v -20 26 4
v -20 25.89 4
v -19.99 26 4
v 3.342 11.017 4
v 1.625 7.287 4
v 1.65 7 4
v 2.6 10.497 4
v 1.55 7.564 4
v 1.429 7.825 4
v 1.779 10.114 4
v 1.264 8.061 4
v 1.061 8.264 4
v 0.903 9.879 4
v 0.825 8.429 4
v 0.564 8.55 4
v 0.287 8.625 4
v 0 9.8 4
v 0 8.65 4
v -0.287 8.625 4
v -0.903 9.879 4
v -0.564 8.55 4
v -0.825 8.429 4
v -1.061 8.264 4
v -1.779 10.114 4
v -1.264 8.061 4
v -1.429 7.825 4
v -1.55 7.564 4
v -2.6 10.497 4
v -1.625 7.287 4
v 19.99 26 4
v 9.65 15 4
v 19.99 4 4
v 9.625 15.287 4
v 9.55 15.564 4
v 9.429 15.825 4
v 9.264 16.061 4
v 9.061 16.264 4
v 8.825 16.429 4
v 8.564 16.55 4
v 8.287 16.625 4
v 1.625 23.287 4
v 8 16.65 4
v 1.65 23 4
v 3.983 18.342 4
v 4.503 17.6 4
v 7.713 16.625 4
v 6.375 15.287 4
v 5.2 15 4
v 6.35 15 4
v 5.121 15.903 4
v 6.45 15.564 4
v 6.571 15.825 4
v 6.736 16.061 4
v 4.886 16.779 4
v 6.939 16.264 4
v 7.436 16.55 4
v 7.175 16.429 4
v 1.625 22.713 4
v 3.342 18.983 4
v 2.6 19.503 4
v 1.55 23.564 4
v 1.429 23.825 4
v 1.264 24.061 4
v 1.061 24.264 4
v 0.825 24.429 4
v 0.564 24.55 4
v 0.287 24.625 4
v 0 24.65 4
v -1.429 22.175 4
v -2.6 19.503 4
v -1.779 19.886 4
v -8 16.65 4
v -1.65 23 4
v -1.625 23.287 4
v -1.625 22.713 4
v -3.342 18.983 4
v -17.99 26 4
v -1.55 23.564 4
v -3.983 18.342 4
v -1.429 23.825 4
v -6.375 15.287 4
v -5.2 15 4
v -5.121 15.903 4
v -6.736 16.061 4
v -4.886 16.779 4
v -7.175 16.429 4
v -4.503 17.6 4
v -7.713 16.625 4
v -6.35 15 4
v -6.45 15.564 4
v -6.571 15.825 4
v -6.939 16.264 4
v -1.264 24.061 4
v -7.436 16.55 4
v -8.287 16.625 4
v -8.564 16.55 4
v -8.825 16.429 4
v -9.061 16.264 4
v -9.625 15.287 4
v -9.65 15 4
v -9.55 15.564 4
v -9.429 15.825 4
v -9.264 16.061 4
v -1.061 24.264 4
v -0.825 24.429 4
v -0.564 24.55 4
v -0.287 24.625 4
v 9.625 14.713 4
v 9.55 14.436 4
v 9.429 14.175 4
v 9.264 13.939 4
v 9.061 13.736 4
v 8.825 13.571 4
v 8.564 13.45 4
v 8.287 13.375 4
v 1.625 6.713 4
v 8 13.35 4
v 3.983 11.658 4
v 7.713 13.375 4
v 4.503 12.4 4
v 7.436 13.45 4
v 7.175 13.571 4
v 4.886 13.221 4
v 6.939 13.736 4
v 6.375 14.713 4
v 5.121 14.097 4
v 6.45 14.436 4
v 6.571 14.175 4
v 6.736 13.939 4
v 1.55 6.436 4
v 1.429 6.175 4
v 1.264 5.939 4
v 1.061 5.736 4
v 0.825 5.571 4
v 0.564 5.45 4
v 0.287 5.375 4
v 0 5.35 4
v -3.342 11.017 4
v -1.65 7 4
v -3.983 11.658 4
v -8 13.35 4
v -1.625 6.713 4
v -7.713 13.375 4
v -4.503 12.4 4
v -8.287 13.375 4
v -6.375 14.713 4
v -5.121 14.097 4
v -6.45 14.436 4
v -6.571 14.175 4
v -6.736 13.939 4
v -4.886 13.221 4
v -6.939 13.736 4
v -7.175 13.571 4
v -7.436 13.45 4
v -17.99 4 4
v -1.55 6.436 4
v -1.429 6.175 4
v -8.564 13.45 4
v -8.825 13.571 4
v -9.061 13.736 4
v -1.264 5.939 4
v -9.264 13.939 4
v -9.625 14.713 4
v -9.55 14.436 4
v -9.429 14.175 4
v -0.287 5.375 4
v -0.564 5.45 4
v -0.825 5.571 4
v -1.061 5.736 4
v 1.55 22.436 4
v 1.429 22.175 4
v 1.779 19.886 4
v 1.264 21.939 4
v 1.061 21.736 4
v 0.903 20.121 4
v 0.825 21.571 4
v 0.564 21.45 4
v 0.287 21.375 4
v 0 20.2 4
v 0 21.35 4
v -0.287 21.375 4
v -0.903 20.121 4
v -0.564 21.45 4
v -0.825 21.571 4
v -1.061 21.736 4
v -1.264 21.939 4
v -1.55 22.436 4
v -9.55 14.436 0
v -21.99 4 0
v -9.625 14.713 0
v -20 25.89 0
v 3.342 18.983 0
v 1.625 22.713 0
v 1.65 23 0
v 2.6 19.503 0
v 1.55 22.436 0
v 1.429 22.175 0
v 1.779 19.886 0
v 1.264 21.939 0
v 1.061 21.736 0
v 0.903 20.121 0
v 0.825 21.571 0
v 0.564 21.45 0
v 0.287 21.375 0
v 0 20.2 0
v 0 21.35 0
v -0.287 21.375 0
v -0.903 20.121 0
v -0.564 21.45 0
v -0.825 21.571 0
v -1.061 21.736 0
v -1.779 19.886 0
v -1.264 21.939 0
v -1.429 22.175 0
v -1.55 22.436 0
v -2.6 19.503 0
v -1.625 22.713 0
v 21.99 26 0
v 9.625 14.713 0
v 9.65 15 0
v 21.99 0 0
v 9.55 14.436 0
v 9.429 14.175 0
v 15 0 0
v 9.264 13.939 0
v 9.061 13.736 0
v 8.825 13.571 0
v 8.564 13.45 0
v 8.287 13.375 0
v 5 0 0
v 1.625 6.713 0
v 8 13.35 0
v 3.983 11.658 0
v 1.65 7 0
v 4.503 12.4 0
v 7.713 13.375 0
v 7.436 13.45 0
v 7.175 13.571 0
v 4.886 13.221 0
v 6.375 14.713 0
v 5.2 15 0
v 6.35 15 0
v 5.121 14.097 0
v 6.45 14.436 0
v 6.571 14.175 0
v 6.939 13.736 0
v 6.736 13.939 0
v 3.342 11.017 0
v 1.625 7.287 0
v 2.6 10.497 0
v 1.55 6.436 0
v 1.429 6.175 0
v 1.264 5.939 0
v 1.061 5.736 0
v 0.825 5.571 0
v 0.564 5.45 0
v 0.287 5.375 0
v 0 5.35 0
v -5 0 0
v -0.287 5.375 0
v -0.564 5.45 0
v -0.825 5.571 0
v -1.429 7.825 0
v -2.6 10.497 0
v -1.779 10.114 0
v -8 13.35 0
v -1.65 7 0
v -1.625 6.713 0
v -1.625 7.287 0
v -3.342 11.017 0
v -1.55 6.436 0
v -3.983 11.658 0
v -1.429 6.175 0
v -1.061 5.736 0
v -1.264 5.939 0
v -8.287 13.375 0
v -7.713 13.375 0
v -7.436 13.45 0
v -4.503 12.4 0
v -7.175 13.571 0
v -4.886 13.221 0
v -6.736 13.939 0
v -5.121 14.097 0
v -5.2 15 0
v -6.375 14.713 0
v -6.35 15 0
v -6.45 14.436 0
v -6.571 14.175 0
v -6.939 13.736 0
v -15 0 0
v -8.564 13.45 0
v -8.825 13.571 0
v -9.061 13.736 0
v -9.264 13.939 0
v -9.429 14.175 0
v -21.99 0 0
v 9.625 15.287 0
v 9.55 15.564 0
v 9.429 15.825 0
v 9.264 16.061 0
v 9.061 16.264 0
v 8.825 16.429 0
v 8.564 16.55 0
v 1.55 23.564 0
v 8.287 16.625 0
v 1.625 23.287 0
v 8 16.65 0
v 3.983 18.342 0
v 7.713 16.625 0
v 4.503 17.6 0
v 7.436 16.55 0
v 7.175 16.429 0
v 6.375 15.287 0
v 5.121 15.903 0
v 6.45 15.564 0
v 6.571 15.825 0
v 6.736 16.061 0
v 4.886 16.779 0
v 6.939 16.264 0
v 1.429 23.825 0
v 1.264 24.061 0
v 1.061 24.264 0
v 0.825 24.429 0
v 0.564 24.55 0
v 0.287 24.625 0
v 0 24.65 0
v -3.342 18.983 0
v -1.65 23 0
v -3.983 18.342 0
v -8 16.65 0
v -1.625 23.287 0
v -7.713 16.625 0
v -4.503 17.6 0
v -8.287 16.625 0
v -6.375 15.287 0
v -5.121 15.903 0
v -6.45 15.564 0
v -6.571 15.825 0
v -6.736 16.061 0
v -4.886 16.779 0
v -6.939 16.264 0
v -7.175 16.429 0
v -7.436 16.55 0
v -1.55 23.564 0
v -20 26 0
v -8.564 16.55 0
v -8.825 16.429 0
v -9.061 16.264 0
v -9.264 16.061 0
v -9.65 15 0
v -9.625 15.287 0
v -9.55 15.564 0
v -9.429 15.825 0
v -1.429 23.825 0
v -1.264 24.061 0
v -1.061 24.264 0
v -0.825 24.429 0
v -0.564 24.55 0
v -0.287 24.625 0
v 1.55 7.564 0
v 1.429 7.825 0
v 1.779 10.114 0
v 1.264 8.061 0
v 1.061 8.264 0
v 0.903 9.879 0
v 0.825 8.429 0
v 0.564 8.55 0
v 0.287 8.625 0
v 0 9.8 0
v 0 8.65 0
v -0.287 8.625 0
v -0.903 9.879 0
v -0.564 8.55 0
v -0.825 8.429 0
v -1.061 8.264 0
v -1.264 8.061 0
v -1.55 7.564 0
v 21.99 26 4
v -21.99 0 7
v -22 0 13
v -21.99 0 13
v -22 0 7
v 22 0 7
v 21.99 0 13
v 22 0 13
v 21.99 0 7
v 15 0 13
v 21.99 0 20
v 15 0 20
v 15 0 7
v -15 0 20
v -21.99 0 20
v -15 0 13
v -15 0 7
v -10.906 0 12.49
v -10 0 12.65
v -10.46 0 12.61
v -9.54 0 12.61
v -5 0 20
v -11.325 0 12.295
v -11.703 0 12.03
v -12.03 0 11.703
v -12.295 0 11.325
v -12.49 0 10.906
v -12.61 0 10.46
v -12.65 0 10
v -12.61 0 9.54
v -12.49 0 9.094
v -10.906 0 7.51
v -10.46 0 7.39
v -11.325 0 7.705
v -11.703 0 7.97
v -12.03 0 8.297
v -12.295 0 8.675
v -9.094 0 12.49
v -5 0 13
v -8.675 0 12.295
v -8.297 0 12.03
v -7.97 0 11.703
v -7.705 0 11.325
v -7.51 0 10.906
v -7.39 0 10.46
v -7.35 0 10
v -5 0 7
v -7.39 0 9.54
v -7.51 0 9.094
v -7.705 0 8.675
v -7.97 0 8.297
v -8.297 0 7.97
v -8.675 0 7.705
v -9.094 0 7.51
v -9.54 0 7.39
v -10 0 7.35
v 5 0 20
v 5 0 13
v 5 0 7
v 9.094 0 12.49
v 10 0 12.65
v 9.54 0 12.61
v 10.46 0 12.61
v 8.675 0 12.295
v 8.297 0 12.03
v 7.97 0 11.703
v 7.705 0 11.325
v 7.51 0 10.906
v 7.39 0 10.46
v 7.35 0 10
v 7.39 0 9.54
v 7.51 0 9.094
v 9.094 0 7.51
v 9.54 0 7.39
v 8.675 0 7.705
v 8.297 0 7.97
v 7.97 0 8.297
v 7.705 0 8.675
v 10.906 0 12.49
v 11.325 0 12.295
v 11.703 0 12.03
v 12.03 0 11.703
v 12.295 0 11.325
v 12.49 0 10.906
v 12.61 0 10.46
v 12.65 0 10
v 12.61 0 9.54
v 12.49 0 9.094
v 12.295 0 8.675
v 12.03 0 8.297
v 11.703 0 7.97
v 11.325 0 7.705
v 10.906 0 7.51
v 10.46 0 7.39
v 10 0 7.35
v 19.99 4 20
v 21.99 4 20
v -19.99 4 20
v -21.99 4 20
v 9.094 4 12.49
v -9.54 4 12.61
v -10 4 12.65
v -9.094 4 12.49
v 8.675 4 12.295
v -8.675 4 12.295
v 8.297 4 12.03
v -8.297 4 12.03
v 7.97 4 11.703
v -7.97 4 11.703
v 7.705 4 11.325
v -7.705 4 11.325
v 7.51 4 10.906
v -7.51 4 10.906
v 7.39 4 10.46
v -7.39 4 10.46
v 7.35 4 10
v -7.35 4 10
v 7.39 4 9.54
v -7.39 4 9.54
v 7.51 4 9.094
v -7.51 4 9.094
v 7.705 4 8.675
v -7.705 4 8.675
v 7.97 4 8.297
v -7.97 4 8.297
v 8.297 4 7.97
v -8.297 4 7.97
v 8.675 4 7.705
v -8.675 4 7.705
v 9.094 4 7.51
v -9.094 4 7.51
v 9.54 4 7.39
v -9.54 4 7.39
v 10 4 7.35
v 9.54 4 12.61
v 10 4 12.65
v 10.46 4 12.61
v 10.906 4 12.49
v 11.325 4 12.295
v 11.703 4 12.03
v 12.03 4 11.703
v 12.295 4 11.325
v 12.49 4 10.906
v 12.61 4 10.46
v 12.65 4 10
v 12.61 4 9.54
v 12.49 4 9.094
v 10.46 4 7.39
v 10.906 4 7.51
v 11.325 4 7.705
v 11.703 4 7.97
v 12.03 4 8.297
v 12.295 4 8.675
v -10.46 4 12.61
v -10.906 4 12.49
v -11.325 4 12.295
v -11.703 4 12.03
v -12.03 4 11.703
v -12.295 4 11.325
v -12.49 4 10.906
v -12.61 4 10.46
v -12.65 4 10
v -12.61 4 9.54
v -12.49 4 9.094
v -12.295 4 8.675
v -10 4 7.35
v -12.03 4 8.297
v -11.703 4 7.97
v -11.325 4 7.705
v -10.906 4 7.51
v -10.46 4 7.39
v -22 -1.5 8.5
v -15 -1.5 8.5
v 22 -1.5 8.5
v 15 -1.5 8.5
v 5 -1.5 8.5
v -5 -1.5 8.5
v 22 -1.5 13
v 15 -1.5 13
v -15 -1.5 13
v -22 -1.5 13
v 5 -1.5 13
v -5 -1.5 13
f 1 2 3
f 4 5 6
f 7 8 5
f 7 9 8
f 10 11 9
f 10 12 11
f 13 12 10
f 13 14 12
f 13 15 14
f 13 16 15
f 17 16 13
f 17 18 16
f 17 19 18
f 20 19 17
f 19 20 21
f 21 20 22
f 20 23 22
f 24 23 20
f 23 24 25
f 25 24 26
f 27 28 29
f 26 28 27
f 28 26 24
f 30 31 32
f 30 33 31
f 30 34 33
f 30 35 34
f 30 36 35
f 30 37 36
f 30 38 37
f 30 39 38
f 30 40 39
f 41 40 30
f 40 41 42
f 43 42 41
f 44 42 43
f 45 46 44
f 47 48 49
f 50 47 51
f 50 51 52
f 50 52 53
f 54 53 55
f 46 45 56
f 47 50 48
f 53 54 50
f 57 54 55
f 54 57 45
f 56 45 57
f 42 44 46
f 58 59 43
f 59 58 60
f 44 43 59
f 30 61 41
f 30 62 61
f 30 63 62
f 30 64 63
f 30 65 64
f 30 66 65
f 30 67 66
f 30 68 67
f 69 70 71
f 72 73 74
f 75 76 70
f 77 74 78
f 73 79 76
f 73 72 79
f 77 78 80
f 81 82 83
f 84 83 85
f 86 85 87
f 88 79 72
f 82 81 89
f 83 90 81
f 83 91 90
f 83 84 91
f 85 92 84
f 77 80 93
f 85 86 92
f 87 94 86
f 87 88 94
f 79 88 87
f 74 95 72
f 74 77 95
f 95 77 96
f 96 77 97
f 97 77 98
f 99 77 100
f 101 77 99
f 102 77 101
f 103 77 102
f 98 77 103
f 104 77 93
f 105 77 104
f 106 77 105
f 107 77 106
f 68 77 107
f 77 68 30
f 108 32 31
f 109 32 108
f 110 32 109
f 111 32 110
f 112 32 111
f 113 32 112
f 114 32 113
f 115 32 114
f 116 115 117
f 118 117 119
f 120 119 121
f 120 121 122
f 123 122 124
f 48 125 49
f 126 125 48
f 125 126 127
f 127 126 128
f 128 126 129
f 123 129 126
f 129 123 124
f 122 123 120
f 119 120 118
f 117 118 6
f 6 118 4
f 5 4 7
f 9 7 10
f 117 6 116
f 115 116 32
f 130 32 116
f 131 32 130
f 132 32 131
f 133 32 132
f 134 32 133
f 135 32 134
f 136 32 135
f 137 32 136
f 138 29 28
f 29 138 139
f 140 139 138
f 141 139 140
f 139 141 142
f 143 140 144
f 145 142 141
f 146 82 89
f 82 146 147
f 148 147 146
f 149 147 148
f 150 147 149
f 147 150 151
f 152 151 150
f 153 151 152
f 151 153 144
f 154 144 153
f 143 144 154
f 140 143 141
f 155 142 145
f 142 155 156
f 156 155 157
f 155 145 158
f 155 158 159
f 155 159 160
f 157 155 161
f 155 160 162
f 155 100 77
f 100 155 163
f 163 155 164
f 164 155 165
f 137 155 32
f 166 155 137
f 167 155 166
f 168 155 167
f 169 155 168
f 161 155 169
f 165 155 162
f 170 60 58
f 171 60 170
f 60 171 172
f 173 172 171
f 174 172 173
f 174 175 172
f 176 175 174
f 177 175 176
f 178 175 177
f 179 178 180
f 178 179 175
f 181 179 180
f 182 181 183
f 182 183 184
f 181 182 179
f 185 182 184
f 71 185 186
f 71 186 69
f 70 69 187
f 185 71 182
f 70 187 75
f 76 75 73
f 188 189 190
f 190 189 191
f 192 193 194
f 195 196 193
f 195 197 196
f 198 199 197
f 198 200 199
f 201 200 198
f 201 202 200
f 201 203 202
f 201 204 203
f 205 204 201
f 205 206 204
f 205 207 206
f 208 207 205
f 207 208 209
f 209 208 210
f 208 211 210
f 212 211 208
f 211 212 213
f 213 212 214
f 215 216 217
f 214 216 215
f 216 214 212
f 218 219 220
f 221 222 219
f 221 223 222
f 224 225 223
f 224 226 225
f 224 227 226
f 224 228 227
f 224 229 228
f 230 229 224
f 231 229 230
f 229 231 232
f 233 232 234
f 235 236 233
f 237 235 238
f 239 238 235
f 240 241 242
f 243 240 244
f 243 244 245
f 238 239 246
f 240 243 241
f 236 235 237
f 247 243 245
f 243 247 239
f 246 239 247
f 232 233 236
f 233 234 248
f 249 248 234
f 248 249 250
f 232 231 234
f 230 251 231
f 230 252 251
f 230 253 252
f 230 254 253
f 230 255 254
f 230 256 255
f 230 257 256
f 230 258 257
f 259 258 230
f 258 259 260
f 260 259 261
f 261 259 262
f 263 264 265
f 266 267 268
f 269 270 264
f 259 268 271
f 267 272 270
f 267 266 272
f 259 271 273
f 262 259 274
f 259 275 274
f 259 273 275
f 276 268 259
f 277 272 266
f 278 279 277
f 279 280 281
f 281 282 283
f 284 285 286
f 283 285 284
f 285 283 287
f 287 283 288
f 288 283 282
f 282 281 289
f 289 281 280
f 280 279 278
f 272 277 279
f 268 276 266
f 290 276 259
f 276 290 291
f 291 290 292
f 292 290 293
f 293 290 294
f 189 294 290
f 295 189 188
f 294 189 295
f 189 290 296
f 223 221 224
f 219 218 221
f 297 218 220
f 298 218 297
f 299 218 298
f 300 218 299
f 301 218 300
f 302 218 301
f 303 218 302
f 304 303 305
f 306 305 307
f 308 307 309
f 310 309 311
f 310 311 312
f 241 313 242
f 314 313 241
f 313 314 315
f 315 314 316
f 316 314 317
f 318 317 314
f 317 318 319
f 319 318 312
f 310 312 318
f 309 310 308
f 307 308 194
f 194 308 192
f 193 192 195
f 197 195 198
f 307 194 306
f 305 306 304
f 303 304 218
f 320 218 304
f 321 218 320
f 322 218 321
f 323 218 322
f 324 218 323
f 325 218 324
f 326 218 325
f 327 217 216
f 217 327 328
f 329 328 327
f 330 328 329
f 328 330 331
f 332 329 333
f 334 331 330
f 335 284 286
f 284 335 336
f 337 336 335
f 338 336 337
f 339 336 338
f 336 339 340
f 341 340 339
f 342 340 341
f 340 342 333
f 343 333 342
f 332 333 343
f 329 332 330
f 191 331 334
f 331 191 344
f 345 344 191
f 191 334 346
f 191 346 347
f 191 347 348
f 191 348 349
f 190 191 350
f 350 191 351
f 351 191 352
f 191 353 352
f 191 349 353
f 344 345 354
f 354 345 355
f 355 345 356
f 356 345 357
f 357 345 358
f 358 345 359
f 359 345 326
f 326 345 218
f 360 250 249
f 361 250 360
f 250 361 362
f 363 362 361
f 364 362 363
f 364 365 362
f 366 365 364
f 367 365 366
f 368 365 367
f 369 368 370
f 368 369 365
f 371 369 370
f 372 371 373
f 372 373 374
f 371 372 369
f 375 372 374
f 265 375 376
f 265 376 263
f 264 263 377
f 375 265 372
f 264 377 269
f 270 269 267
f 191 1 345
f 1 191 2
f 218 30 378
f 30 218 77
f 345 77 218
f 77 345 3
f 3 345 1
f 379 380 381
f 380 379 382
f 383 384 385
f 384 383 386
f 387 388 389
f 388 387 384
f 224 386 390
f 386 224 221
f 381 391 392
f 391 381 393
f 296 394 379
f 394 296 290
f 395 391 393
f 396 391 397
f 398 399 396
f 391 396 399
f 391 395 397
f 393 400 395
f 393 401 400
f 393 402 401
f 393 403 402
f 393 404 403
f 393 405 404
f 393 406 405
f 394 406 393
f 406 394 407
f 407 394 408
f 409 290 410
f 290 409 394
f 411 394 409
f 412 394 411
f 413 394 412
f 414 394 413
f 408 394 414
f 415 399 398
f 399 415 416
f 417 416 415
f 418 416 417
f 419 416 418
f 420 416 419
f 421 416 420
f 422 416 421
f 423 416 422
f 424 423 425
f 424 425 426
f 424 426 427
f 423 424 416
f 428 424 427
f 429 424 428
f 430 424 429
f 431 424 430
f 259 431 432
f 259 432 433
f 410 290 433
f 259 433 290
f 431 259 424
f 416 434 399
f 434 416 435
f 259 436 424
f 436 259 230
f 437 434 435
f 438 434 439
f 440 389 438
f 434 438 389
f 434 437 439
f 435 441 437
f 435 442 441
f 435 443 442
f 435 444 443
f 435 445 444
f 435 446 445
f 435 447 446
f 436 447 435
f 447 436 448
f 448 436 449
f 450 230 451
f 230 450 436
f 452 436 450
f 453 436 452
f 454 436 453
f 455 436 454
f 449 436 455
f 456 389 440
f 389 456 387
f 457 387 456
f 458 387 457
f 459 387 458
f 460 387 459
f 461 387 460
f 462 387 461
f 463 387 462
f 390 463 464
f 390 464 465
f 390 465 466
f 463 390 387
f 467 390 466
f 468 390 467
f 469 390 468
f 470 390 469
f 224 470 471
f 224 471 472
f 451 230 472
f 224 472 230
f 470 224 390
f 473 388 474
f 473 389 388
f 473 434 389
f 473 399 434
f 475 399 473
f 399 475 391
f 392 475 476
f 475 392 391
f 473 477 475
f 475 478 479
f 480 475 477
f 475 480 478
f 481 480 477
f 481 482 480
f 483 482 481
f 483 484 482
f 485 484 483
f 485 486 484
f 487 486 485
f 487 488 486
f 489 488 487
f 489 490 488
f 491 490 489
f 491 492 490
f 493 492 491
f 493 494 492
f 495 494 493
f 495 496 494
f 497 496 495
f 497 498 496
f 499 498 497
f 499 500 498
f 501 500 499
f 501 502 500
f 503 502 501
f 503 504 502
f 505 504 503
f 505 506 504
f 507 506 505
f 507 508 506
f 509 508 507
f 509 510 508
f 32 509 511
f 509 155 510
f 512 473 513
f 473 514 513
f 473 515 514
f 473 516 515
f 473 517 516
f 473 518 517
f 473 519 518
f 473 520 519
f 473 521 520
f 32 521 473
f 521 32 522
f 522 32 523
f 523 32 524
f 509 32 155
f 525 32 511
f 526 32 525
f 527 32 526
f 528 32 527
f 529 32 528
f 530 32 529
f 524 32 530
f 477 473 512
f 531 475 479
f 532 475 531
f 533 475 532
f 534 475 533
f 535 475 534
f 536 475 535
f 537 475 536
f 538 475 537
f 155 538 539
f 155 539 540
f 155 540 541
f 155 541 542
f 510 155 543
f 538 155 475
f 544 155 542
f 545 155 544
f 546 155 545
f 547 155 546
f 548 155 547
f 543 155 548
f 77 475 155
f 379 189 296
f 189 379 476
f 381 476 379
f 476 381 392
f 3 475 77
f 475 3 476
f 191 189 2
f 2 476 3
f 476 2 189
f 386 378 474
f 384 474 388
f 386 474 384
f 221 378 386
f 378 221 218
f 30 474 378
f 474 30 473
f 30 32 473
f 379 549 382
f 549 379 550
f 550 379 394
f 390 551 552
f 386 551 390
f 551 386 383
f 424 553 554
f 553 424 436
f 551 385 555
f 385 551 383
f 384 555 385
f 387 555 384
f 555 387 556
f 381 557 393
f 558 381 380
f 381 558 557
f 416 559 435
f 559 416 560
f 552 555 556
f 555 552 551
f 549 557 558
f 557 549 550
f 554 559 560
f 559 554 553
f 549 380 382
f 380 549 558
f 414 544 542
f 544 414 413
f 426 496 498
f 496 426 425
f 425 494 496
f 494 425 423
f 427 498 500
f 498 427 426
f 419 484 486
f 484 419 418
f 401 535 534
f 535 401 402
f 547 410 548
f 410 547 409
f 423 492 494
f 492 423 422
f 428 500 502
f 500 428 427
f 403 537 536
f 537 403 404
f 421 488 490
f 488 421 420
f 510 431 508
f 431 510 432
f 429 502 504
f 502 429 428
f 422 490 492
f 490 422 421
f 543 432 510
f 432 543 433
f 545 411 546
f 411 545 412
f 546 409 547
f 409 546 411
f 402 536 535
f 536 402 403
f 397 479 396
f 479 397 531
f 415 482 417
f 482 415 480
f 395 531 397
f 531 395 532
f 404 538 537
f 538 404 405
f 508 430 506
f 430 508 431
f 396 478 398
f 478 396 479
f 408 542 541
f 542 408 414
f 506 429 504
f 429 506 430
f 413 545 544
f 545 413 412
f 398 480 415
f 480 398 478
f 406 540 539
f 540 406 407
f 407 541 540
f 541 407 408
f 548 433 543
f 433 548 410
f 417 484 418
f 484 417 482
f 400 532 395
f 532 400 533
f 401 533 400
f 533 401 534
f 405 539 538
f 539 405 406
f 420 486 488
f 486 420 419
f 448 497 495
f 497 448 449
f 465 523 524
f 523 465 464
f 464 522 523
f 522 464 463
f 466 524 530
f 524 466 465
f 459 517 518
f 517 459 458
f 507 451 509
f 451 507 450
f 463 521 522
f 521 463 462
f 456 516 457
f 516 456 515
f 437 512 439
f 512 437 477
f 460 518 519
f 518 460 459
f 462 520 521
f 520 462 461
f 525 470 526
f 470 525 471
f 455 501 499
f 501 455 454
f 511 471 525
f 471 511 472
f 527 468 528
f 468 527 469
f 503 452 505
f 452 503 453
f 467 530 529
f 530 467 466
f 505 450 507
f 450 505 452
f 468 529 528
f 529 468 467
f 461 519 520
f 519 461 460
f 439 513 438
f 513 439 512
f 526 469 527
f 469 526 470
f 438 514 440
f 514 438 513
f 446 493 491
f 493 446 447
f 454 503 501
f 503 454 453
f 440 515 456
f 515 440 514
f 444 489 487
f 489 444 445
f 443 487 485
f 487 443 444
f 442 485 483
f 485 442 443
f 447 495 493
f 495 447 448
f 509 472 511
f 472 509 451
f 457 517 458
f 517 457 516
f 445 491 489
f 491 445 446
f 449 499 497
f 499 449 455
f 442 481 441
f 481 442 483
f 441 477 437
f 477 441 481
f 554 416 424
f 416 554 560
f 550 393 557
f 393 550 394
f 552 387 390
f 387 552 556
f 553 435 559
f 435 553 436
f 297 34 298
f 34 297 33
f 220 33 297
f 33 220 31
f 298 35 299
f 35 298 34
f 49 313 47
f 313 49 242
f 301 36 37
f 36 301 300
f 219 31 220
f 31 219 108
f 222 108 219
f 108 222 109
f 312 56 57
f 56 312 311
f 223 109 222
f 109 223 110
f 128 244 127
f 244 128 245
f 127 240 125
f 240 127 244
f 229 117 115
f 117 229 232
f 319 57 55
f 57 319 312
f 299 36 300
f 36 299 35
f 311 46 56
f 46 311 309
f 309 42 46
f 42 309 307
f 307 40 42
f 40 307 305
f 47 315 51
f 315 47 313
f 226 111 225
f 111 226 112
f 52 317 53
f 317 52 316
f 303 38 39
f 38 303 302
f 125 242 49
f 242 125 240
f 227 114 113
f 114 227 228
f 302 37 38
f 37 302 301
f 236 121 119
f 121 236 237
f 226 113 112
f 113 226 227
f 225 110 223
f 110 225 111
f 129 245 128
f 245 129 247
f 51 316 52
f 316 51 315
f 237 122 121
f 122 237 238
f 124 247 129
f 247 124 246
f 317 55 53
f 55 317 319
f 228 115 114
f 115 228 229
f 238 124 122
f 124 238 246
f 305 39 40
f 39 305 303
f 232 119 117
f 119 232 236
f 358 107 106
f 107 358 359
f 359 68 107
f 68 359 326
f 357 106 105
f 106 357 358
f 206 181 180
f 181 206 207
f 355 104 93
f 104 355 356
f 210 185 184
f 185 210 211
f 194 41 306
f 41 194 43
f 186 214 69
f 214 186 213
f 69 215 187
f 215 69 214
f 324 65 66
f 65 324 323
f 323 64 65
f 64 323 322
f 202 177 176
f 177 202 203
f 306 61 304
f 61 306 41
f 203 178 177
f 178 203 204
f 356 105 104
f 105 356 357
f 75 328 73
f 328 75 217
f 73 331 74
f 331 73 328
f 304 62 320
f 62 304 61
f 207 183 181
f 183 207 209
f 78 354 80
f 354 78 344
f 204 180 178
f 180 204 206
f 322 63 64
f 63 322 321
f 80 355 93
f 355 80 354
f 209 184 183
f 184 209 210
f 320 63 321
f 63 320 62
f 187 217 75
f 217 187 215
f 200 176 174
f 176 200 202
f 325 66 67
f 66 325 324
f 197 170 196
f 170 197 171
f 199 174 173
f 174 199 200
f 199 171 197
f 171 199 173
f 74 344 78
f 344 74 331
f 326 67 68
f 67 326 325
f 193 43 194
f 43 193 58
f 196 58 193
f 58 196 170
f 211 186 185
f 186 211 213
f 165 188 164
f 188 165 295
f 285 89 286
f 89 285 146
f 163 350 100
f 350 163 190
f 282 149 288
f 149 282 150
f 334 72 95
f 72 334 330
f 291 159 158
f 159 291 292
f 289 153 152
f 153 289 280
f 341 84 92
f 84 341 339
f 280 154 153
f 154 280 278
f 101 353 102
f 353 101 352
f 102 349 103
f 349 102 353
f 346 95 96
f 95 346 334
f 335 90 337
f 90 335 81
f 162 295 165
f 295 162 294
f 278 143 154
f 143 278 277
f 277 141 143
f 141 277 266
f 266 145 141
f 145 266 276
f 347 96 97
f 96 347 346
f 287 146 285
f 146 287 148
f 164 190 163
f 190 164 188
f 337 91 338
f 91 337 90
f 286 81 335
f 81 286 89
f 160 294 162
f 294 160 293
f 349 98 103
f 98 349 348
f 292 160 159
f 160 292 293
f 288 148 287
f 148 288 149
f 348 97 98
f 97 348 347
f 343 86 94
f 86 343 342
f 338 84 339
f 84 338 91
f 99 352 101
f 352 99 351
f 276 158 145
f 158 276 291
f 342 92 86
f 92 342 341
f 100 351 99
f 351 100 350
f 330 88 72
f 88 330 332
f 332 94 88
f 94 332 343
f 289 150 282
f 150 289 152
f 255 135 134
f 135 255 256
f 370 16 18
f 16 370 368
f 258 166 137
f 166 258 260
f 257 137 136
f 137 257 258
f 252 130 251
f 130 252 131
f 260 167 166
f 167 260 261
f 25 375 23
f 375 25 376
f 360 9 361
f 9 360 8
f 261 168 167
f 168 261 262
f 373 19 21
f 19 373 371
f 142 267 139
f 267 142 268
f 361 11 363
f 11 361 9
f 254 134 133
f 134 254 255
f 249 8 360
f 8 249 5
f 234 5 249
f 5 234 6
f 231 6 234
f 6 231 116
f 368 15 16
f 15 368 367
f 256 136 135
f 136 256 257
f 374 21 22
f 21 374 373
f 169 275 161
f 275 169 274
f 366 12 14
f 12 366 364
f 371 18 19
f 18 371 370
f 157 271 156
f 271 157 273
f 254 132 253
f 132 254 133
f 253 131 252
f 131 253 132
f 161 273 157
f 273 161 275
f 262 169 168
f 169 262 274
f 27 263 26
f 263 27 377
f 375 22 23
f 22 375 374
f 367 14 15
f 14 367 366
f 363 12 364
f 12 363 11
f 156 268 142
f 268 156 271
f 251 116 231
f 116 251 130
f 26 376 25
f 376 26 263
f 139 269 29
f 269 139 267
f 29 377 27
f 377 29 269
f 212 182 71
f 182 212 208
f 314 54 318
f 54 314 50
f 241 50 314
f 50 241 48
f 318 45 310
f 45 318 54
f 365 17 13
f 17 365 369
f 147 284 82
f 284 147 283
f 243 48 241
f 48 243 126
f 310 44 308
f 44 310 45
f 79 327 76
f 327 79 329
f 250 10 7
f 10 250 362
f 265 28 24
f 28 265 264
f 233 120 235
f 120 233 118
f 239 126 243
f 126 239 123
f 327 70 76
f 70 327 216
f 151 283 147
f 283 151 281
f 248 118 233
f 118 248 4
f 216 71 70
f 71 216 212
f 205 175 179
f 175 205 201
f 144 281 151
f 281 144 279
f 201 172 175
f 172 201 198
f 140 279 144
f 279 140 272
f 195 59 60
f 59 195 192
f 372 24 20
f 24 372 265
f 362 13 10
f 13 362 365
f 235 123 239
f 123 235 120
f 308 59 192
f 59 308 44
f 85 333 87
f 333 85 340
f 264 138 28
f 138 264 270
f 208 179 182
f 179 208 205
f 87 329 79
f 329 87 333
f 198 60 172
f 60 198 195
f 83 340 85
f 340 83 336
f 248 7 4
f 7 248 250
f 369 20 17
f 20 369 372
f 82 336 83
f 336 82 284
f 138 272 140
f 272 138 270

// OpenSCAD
//3D printer z-nut bracket for 2020 extrusion
//2017, John Stäck (john@stack.se)
//Licensed under Creative Commons Attribution Share-Alike (CC BY-SA 3.0)


$fn=36;

rail_height=20; //2020 rail
slot_width=6;
notch_depth=1.5;
rail_screw_diameter=5.3; //M5 + margin

nut_diameter=22;
axle_hole = 10.4; //Just 8mm axle, but nut has 10mm collar, some margin for it.
nut_screw_diameter=3.3; //M3 + margin
nut_screw_distance=16;

slot_nut_length=10;

bracket_length=40;
bracket_width=26;
endplate_thickness=2;
bracket_thickness=4;
e=0.01;



difference() {
    union() {
        
       //Base parts of bracket
       translate([-bracket_length/2,0,0]) {
           cube([bracket_length, bracket_width, bracket_thickness]); 
           cube([bracket_length, bracket_thickness, rail_height]);

       }
       
       //Endplates
       for(i=[-1,1]) {
           translate([i*(bracket_length/2-e), 0, 0]) hull() {
               cube([endplate_thickness, bracket_width, bracket_thickness]);
               scale([i,1,1]) cube([endplate_thickness, bracket_thickness, rail_height]);
           }
       }       
       
       //Notch into rail
       notch_points=[[0,-slot_width/2],[notch_depth,-slot_width/2+notch_depth],[notch_depth,slot_width/2],[0,slot_width/2]];
       notch_path=[[0,1,2,3,0]];
       
       translate([bracket_length/2+endplate_thickness,0,rail_height/2]) rotate([90,0,-90])  linear_extrude(height=bracket_length+endplate_thickness*2) polygon(points=notch_points, paths=notch_path, convexity=2);
       
    }
    
    union() {
        //Holes for mounting bolts to rail
        for(i=[-1,1])
            translate([i*bracket_length/4, -e, rail_height/2]) rotate([-90,0,0]) cylinder(d=rail_screw_diameter, h=bracket_thickness+2*e);
        
        //Cutout in notch for slot nuts
         for(i=[-1,1])
            translate([i*bracket_length/4-slot_nut_length/2,-notch_depth-e,0]) cube([slot_nut_length,notch_depth+e,rail_height]);
        
        translate([0,bracket_width-nut_diameter/2, -e]) {
            
            //Axle hole
            cylinder(d=axle_hole, h=bracket_thickness+2*e);
            
            //Mounting screws
            for(v=[0:90:270]) {
                rotate([0,0,v]) translate([nut_screw_distance/2,0,0]) cylinder(d=nut_screw_diameter, h=bracket_thickness+2*e);
            }
        }
        
    }
}
